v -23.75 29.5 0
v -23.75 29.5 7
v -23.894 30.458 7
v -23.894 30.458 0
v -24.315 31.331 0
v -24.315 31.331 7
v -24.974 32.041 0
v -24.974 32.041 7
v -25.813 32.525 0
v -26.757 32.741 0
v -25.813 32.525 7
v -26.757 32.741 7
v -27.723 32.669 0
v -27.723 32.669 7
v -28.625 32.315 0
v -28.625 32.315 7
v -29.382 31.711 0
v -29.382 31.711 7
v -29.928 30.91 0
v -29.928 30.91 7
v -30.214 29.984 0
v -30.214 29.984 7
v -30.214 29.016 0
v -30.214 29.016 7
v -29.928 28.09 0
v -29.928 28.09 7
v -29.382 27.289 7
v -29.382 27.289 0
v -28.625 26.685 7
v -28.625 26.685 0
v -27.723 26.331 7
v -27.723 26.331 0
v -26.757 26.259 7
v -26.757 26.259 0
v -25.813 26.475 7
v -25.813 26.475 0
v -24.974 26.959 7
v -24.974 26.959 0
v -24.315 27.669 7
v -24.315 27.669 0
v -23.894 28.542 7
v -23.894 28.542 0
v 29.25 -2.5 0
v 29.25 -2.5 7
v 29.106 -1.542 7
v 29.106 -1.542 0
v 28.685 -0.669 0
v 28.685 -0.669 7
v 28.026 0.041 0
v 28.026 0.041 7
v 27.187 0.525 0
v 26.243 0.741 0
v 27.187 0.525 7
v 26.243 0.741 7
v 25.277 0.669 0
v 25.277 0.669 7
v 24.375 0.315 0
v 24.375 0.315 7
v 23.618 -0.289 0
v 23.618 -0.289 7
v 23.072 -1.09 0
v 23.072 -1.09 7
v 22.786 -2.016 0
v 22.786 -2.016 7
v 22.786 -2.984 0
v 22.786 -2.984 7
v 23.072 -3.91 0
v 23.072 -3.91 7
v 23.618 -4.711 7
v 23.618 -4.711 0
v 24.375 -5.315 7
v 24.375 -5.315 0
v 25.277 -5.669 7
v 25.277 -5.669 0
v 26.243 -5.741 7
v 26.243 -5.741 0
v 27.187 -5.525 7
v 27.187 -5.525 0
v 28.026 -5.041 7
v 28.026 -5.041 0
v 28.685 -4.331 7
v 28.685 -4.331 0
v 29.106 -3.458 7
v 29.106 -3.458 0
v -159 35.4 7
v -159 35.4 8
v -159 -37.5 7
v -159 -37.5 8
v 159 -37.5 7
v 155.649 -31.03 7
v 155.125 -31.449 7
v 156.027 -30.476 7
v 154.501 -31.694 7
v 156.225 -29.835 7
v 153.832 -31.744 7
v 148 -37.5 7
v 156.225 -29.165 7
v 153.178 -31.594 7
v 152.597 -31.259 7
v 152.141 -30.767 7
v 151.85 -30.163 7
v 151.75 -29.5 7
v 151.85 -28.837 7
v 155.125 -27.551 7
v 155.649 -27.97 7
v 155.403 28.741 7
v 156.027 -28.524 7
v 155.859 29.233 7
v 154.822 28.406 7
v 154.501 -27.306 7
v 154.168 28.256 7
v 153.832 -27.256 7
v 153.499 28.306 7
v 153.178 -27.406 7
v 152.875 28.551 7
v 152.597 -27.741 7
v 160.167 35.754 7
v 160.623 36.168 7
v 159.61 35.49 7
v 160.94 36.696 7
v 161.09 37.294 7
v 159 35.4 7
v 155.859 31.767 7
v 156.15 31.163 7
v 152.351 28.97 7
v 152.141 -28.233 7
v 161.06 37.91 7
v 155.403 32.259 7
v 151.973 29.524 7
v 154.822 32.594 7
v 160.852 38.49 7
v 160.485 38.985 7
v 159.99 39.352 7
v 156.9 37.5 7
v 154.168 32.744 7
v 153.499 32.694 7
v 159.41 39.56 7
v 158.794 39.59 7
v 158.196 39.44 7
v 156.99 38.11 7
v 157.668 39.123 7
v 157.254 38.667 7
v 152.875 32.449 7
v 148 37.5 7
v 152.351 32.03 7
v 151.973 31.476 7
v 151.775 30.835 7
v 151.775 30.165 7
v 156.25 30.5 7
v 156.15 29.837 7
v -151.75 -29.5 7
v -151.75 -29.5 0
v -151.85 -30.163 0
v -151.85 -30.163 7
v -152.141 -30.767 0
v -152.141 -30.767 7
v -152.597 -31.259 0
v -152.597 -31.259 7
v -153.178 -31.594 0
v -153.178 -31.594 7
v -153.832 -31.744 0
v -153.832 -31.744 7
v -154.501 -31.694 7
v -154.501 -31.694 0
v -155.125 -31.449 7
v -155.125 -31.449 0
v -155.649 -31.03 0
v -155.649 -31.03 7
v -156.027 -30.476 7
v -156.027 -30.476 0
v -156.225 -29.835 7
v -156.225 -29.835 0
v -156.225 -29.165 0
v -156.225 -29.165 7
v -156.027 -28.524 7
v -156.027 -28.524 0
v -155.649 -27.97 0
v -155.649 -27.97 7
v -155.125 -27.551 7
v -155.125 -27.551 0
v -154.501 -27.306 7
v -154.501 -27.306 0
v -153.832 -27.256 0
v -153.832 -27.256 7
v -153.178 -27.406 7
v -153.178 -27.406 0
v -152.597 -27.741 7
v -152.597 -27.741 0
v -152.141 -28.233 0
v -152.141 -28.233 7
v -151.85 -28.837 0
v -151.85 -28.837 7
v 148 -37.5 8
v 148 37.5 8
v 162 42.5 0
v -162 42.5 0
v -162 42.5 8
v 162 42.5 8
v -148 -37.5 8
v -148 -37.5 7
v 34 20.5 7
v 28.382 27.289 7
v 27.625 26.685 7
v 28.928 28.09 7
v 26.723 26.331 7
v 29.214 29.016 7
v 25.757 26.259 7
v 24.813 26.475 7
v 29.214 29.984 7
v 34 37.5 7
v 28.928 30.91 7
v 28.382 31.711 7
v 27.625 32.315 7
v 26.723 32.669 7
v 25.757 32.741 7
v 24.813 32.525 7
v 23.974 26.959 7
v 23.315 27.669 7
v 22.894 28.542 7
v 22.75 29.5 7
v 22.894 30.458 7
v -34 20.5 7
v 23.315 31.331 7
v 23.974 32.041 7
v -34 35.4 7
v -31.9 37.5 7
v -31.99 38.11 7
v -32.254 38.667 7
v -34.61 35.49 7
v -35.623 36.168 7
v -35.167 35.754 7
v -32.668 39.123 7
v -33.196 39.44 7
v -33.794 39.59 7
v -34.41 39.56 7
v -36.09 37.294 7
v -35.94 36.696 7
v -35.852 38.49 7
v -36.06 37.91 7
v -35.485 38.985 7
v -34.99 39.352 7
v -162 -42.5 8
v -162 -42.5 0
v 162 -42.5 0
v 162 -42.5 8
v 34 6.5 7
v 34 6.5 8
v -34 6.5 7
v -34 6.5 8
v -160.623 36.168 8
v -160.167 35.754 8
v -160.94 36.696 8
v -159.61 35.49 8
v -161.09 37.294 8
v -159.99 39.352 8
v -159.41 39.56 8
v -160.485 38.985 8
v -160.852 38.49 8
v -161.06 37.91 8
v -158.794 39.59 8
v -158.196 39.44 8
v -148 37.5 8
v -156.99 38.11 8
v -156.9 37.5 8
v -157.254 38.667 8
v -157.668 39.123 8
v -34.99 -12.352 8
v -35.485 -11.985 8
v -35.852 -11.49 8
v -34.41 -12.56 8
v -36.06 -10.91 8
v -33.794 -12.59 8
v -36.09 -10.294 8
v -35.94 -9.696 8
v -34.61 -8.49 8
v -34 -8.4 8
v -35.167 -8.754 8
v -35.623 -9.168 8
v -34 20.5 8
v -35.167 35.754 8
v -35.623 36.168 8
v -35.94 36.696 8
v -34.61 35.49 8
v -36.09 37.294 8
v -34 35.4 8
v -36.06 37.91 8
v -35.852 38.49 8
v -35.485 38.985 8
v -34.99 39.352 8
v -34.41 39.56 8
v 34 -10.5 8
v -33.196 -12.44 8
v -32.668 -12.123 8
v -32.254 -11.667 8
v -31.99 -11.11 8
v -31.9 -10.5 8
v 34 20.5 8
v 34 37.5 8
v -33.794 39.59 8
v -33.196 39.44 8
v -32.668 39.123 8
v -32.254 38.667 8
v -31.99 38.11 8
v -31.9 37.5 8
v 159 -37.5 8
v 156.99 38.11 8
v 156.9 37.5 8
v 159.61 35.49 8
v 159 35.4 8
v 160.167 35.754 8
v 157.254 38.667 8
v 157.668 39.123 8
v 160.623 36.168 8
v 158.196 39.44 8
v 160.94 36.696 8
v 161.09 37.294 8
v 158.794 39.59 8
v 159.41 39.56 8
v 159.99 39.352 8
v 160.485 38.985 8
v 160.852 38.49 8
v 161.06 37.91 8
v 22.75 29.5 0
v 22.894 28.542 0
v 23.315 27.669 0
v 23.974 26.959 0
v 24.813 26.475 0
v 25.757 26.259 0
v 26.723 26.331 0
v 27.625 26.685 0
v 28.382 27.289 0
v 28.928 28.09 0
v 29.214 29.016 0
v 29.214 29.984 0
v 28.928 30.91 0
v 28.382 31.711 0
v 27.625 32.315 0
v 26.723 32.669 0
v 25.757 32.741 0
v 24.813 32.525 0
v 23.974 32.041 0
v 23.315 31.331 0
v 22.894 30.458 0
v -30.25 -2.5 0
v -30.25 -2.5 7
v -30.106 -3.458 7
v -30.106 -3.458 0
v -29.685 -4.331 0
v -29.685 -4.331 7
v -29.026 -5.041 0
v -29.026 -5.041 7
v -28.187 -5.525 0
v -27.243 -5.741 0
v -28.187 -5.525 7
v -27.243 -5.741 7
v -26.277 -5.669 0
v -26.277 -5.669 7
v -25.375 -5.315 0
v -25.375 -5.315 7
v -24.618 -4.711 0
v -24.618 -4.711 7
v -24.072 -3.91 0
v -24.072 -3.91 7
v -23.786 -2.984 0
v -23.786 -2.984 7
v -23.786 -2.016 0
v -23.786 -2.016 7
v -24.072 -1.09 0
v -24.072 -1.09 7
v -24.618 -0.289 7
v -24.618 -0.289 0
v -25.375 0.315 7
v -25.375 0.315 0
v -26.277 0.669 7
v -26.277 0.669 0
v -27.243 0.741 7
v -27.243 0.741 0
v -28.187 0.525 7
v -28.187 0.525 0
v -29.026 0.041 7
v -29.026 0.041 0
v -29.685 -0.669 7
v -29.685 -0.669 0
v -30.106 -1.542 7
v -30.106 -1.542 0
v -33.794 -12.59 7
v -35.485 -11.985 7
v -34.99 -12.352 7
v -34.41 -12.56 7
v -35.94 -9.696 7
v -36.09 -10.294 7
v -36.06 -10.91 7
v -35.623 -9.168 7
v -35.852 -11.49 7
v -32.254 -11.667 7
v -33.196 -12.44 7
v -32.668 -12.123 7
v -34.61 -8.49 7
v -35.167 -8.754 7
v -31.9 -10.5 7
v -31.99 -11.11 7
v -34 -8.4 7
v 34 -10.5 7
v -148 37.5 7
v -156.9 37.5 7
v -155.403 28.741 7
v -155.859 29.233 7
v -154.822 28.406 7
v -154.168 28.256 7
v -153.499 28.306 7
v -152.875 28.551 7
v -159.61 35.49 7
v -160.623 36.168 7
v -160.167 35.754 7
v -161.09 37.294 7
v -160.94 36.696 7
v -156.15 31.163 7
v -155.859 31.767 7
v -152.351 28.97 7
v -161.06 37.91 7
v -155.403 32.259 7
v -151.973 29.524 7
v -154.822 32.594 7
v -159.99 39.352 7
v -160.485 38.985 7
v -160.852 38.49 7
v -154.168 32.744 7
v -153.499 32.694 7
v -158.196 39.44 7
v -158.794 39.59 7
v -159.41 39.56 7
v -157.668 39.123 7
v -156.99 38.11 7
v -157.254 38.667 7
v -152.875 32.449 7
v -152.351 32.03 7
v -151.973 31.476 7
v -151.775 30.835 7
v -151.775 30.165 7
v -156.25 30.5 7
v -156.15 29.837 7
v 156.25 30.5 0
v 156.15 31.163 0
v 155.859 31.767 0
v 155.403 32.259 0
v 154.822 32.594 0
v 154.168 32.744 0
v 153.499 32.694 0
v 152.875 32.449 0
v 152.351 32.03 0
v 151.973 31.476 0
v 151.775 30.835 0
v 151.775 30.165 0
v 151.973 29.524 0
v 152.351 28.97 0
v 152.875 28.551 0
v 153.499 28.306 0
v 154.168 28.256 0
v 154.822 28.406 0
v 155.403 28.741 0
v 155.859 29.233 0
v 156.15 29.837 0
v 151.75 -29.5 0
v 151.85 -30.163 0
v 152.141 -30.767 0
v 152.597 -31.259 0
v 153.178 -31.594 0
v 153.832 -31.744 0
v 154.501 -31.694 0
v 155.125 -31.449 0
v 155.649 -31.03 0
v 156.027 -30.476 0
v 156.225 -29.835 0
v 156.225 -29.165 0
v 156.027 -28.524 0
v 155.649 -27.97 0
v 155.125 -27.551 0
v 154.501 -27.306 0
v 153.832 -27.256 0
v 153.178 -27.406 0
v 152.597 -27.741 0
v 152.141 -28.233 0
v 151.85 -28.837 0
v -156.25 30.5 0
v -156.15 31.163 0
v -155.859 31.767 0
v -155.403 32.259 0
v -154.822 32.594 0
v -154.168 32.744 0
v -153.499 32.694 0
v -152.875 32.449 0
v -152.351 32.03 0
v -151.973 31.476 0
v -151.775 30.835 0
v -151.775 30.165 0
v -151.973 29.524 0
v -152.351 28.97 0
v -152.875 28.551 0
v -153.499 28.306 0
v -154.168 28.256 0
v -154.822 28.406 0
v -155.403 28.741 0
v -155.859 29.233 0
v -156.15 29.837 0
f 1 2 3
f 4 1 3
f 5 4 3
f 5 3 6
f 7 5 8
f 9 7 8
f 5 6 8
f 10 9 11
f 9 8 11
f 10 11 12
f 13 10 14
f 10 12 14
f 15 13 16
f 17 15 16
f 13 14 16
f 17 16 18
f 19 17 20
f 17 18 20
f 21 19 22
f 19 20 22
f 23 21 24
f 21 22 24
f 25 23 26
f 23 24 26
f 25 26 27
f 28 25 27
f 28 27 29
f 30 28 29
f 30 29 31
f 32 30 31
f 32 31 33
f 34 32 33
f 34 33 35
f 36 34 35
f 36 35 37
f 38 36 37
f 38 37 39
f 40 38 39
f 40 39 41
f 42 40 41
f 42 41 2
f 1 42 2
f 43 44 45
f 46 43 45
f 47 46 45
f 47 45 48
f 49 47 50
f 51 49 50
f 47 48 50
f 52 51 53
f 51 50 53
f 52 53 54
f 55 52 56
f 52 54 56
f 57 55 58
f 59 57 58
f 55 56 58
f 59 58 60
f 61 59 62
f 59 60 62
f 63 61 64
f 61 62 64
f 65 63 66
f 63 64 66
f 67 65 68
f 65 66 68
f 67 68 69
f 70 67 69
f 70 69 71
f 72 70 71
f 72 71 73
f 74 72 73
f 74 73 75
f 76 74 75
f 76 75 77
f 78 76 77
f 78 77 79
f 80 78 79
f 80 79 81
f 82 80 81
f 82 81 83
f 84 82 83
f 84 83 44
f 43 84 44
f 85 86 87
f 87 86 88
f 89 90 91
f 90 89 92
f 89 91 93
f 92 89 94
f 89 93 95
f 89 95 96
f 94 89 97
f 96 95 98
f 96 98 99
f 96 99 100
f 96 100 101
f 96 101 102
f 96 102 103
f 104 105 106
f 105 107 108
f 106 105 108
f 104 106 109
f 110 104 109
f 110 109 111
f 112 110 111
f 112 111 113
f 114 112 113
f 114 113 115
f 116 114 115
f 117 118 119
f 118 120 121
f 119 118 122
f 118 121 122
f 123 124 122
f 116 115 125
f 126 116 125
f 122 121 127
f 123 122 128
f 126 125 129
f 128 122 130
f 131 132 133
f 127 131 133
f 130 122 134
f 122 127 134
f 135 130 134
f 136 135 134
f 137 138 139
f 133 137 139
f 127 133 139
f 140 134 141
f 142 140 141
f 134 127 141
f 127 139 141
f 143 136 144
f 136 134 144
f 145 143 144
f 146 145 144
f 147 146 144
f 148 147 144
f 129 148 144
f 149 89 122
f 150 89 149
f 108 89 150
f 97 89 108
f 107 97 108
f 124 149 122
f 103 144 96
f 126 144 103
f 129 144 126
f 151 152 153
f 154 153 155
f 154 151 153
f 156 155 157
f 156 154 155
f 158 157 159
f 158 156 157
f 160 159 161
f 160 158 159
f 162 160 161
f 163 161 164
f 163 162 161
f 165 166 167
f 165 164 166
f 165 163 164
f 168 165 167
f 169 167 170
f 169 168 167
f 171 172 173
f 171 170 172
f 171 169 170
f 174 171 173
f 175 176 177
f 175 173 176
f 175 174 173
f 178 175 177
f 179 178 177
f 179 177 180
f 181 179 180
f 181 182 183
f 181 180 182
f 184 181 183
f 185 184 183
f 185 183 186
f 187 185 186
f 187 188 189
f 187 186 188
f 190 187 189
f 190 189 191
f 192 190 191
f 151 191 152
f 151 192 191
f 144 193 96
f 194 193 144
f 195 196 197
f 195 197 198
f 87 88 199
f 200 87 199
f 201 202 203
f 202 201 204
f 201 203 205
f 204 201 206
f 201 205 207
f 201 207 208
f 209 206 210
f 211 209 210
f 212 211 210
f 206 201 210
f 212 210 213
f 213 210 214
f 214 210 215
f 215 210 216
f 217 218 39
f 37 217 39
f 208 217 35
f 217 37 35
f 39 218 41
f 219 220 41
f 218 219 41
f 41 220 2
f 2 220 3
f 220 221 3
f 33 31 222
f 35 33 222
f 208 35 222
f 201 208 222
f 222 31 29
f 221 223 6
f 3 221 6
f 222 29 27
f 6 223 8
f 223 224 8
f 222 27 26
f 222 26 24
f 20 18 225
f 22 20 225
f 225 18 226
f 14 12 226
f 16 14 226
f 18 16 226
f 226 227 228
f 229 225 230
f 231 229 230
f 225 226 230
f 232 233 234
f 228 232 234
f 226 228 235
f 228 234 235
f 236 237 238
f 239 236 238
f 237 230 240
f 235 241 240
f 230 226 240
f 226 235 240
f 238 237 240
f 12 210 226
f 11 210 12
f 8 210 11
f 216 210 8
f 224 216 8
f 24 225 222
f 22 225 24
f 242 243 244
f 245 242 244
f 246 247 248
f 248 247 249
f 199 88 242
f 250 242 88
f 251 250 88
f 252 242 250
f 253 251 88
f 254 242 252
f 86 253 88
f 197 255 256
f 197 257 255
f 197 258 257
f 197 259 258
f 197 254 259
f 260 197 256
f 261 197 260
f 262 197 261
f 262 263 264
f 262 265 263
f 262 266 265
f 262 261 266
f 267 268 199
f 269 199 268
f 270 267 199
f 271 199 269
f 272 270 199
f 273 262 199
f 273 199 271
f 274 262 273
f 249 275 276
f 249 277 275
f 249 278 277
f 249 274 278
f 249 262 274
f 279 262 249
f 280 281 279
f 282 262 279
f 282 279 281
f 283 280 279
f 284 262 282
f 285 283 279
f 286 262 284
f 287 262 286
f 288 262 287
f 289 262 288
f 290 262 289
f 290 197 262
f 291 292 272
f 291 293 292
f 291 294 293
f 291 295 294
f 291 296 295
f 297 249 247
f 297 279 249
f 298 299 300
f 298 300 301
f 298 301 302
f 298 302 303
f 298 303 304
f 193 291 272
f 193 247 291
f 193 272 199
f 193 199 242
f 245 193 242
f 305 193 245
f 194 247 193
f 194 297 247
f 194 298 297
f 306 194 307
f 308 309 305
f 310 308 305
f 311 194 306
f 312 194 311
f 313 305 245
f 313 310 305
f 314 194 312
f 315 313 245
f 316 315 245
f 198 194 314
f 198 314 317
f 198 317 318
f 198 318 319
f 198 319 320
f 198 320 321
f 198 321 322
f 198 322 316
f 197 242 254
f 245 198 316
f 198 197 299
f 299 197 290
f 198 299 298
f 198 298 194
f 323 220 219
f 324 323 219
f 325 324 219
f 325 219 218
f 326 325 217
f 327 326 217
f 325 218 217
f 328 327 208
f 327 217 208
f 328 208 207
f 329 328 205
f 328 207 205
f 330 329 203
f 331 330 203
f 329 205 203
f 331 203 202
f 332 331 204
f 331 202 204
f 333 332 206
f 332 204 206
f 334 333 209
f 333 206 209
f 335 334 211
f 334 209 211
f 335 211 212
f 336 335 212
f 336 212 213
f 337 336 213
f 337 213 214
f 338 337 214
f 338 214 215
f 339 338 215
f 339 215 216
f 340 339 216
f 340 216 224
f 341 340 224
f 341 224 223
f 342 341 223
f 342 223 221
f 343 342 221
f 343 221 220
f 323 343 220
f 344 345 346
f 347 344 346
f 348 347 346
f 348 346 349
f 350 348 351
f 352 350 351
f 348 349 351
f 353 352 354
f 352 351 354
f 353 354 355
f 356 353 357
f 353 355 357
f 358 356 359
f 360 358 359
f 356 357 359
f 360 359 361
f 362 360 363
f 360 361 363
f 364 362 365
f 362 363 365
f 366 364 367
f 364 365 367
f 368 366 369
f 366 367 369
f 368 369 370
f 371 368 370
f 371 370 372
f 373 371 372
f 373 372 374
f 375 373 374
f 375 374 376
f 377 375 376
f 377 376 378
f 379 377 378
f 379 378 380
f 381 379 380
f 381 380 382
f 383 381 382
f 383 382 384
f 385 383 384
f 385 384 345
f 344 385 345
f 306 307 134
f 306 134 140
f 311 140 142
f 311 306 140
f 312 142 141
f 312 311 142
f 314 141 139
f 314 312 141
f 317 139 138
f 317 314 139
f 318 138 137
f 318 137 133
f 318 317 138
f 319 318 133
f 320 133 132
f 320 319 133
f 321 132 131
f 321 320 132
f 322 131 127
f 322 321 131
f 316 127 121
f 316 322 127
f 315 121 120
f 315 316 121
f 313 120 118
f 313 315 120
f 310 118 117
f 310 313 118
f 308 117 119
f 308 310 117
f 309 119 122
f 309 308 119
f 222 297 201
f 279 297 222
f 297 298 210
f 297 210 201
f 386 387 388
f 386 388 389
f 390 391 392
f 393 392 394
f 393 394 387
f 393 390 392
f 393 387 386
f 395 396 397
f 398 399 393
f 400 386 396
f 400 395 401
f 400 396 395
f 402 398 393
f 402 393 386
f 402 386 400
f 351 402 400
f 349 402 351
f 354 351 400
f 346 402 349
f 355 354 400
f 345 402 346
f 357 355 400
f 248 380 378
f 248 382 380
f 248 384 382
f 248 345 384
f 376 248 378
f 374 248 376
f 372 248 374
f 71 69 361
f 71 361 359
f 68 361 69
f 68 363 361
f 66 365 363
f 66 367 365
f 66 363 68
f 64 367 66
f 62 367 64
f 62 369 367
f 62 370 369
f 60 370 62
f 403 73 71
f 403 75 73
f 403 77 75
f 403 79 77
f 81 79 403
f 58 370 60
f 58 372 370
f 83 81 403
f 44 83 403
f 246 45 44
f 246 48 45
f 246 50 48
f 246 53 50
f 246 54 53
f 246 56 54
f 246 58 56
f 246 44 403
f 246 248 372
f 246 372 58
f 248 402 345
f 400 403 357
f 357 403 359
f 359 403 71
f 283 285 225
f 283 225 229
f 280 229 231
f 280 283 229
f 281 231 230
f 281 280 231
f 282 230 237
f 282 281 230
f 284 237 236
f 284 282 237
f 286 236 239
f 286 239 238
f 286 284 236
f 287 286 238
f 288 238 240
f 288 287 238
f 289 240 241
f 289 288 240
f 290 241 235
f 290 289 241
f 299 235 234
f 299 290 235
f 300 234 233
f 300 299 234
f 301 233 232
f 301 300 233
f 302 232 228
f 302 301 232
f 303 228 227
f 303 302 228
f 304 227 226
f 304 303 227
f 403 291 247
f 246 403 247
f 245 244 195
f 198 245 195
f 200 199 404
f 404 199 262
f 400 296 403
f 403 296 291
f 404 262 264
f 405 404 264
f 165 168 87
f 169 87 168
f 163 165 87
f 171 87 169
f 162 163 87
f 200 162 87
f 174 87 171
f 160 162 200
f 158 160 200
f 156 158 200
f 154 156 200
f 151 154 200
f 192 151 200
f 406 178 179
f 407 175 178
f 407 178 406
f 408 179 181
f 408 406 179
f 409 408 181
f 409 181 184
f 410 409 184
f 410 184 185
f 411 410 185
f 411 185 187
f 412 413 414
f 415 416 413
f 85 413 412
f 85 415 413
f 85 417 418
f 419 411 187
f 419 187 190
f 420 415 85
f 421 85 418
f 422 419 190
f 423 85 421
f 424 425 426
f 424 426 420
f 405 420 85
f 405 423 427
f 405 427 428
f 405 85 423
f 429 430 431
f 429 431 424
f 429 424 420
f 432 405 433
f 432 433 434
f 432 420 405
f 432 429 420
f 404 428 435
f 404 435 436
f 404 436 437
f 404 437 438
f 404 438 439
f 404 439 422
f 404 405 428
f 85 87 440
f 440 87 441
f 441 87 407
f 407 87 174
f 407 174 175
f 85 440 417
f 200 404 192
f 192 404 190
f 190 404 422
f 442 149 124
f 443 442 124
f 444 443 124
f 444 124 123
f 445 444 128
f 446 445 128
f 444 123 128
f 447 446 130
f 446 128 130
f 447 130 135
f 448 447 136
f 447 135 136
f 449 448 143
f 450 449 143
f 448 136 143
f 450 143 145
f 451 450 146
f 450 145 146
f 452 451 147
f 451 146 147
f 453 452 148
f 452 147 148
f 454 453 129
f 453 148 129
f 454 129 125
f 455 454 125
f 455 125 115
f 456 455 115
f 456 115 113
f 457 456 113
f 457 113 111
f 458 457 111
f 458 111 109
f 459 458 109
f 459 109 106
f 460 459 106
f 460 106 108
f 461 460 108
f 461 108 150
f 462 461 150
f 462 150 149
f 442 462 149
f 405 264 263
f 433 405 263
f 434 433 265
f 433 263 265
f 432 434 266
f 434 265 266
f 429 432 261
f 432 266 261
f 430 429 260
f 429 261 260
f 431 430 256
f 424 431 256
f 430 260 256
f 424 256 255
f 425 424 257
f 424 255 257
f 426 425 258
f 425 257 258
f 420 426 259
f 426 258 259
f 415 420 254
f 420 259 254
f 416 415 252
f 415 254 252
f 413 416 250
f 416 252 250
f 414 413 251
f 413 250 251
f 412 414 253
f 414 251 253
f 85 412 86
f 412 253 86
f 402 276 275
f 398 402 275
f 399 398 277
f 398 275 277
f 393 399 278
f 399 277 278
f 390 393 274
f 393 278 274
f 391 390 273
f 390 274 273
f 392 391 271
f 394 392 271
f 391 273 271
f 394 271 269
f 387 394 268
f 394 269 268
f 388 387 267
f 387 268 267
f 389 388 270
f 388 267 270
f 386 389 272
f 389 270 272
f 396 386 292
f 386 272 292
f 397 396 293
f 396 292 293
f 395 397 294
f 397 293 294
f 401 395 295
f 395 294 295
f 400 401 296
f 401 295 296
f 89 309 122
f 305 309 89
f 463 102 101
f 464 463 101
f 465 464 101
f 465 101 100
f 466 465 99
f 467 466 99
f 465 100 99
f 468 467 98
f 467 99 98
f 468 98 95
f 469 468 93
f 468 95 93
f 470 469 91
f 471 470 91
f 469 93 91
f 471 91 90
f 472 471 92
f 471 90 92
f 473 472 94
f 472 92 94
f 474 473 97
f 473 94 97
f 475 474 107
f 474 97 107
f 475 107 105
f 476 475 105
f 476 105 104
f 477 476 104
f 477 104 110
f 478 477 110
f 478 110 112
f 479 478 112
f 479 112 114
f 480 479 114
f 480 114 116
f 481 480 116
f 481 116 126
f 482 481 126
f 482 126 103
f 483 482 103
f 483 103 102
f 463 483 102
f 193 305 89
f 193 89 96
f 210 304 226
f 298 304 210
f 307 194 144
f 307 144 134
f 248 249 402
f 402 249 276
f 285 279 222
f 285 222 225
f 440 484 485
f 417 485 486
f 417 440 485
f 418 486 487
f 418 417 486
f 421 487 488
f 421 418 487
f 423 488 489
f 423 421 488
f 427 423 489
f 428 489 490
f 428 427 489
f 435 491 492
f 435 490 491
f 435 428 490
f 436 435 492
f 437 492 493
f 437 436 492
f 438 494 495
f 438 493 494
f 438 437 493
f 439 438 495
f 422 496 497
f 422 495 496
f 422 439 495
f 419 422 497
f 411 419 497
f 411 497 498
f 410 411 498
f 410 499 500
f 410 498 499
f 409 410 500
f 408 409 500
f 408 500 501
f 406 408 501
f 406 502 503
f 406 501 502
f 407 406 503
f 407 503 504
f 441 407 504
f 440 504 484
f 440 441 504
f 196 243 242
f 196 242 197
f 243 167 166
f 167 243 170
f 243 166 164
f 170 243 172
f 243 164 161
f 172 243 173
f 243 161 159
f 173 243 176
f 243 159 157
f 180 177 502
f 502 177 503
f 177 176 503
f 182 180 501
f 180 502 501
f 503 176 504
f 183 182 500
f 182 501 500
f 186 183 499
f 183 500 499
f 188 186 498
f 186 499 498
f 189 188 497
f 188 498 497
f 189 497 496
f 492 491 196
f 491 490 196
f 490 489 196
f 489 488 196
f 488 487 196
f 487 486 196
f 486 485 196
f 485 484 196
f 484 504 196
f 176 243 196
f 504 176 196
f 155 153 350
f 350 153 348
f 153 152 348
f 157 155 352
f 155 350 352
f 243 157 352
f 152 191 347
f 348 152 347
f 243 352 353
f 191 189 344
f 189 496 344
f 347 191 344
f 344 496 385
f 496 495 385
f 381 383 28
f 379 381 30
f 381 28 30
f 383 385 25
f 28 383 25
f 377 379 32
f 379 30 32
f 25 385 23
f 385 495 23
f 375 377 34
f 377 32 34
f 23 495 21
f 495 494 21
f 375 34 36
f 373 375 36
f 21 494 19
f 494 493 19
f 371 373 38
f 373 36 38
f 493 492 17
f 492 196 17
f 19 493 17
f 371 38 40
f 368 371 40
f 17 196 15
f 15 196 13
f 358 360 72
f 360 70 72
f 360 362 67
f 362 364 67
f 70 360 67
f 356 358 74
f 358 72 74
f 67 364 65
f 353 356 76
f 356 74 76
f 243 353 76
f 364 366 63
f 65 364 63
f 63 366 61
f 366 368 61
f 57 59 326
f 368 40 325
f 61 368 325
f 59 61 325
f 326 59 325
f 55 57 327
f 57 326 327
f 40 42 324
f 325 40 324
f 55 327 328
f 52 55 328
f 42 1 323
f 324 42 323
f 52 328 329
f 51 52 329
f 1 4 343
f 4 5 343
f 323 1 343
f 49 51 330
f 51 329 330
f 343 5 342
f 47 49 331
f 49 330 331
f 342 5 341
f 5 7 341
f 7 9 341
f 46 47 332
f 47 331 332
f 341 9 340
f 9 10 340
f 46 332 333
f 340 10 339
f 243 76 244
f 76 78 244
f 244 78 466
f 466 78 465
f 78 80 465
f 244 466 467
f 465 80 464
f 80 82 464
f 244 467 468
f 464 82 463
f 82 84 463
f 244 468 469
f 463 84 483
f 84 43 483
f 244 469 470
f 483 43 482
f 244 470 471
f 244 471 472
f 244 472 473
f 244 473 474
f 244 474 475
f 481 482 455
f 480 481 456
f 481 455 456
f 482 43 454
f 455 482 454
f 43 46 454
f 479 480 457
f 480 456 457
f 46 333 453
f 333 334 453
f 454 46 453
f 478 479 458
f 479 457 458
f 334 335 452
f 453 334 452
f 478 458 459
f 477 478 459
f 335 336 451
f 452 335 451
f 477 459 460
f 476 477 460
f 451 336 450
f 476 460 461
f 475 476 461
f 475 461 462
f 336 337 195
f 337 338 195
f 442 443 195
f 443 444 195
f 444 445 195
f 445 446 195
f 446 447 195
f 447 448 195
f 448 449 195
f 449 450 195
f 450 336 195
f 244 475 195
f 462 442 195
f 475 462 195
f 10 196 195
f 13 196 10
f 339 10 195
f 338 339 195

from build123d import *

# Parameters (mm, degrees)
ESQUISSE1_W             = 324
ESQUISSE1_H             = 85
BOSS_EXTRU_1_DEPTH      = 8
ENL_V_MAT_EXTRU_1_DEPTH = 1
ESQUISSE3_R             = 2.25
ENL_V_MAT_EXTRU_2_DEPTH = 168.628309065
ENL_V_MAT_EXTRU_3_DEPTH = 1
ESQUISSE5_R             = 3.25
ENL_V_MAT_EXTRU_4_DEPTH = 168.628309065


with BuildPart() as part:
    # Esquisse1 → Boss.-Extru.1 (new body)
    with BuildSketch(Plane.XY):
        Rectangle(ESQUISSE1_W, ESQUISSE1_H)
    extrude(amount=BOSS_EXTRU_1_DEPTH)

    # Esquisse2 → Enlèv. mat.-Extru.1 (cut)
    with BuildSketch(Plane.XY.offset(8)):
        with BuildLine():
            Line((148, 37.5), (156.9, 37.5))
            ThreePointArc((156.9, 37.5), (160.48492424, 38.98492424), (159, 35.4))
            Line((159, 35.4), (159, -37.5))
            Line((159, -37.5), (148, -37.5))
            Line((148, -37.5), (148, 37.5))
        make_face()
    enl_v_mat_extru_1 = extrude(amount=-ENL_V_MAT_EXTRU_1_DEPTH, mode=Mode.SUBTRACT)

    # Symétrie1: Enlèv. mat.-Extru.1 across plane
    add(enl_v_mat_extru_1.mirror(Plane(origin=(0, 0, 0), x_dir=(0, 0, 1), z_dir=(1, 0, 0))), mode=Mode.SUBTRACT)

    # Esquisse3 → Enlèv. mat.-Extru.2 (cut, through all)
    with BuildSketch(Plane.XY.offset(7)):
        with Locations((154, 30.5)):
            Circle(ESQUISSE3_R)
        with Locations(Location((154, -29.5, 0), (0, 0, 180))):
            Circle(ESQUISSE3_R)
    enl_v_mat_extru_2 = extrude(amount=-ENL_V_MAT_EXTRU_2_DEPTH, mode=Mode.SUBTRACT)

    # Symétrie2: Enlèv. mat.-Extru.2 across plane
    add(enl_v_mat_extru_2.mirror(Plane(origin=(0, 0, 0), x_dir=(0, 0, 1), z_dir=(1, 0, 0))), mode=Mode.SUBTRACT)

    # Esquisse4 → Enlèv. mat.-Extru.3 (cut)
    with BuildSketch(Plane.XY.offset(8)):
        with BuildLine():
            Line((-31.9, 37.5), (34, 37.5))
            Line((34, 37.5), (34, 20.5))
            Line((34, 20.5), (-34, 20.5))
            Line((-34, 20.5), (-34, 35.4))
            ThreePointArc((-34, 35.4), (-35.48492424, 38.98492424), (-31.9, 37.5))
        make_face()
        with BuildLine():
            Line((34, -10.5), (34, 6.5))
            Line((34, 6.5), (-34, 6.5))
            Line((-34, 6.5), (-34, -8.4))
            ThreePointArc((-34, -8.4), (-35.48492424, -11.98492424), (-31.9, -10.5))
            Line((-31.9, -10.5), (34, -10.5))
        make_face()
    extrude(amount=-ENL_V_MAT_EXTRU_3_DEPTH, mode=Mode.SUBTRACT)

    # Esquisse5 → Enlèv. mat.-Extru.4 (cut, through all)
    with BuildSketch(Plane.XY.offset(7)):
        with Locations((-27, 29.5)):
            Circle(ESQUISSE5_R)
        with Locations(Location((26, 29.5, 0), (0, 0, 180))):
            Circle(ESQUISSE5_R)
        with Locations((26, -2.5)):
            Circle(ESQUISSE5_R)
        with Locations(Location((-27, -2.5, 0), (0, 0, 180))):
            Circle(ESQUISSE5_R)
    extrude(amount=-ENL_V_MAT_EXTRU_4_DEPTH, mode=Mode.SUBTRACT)


solid = part.part
